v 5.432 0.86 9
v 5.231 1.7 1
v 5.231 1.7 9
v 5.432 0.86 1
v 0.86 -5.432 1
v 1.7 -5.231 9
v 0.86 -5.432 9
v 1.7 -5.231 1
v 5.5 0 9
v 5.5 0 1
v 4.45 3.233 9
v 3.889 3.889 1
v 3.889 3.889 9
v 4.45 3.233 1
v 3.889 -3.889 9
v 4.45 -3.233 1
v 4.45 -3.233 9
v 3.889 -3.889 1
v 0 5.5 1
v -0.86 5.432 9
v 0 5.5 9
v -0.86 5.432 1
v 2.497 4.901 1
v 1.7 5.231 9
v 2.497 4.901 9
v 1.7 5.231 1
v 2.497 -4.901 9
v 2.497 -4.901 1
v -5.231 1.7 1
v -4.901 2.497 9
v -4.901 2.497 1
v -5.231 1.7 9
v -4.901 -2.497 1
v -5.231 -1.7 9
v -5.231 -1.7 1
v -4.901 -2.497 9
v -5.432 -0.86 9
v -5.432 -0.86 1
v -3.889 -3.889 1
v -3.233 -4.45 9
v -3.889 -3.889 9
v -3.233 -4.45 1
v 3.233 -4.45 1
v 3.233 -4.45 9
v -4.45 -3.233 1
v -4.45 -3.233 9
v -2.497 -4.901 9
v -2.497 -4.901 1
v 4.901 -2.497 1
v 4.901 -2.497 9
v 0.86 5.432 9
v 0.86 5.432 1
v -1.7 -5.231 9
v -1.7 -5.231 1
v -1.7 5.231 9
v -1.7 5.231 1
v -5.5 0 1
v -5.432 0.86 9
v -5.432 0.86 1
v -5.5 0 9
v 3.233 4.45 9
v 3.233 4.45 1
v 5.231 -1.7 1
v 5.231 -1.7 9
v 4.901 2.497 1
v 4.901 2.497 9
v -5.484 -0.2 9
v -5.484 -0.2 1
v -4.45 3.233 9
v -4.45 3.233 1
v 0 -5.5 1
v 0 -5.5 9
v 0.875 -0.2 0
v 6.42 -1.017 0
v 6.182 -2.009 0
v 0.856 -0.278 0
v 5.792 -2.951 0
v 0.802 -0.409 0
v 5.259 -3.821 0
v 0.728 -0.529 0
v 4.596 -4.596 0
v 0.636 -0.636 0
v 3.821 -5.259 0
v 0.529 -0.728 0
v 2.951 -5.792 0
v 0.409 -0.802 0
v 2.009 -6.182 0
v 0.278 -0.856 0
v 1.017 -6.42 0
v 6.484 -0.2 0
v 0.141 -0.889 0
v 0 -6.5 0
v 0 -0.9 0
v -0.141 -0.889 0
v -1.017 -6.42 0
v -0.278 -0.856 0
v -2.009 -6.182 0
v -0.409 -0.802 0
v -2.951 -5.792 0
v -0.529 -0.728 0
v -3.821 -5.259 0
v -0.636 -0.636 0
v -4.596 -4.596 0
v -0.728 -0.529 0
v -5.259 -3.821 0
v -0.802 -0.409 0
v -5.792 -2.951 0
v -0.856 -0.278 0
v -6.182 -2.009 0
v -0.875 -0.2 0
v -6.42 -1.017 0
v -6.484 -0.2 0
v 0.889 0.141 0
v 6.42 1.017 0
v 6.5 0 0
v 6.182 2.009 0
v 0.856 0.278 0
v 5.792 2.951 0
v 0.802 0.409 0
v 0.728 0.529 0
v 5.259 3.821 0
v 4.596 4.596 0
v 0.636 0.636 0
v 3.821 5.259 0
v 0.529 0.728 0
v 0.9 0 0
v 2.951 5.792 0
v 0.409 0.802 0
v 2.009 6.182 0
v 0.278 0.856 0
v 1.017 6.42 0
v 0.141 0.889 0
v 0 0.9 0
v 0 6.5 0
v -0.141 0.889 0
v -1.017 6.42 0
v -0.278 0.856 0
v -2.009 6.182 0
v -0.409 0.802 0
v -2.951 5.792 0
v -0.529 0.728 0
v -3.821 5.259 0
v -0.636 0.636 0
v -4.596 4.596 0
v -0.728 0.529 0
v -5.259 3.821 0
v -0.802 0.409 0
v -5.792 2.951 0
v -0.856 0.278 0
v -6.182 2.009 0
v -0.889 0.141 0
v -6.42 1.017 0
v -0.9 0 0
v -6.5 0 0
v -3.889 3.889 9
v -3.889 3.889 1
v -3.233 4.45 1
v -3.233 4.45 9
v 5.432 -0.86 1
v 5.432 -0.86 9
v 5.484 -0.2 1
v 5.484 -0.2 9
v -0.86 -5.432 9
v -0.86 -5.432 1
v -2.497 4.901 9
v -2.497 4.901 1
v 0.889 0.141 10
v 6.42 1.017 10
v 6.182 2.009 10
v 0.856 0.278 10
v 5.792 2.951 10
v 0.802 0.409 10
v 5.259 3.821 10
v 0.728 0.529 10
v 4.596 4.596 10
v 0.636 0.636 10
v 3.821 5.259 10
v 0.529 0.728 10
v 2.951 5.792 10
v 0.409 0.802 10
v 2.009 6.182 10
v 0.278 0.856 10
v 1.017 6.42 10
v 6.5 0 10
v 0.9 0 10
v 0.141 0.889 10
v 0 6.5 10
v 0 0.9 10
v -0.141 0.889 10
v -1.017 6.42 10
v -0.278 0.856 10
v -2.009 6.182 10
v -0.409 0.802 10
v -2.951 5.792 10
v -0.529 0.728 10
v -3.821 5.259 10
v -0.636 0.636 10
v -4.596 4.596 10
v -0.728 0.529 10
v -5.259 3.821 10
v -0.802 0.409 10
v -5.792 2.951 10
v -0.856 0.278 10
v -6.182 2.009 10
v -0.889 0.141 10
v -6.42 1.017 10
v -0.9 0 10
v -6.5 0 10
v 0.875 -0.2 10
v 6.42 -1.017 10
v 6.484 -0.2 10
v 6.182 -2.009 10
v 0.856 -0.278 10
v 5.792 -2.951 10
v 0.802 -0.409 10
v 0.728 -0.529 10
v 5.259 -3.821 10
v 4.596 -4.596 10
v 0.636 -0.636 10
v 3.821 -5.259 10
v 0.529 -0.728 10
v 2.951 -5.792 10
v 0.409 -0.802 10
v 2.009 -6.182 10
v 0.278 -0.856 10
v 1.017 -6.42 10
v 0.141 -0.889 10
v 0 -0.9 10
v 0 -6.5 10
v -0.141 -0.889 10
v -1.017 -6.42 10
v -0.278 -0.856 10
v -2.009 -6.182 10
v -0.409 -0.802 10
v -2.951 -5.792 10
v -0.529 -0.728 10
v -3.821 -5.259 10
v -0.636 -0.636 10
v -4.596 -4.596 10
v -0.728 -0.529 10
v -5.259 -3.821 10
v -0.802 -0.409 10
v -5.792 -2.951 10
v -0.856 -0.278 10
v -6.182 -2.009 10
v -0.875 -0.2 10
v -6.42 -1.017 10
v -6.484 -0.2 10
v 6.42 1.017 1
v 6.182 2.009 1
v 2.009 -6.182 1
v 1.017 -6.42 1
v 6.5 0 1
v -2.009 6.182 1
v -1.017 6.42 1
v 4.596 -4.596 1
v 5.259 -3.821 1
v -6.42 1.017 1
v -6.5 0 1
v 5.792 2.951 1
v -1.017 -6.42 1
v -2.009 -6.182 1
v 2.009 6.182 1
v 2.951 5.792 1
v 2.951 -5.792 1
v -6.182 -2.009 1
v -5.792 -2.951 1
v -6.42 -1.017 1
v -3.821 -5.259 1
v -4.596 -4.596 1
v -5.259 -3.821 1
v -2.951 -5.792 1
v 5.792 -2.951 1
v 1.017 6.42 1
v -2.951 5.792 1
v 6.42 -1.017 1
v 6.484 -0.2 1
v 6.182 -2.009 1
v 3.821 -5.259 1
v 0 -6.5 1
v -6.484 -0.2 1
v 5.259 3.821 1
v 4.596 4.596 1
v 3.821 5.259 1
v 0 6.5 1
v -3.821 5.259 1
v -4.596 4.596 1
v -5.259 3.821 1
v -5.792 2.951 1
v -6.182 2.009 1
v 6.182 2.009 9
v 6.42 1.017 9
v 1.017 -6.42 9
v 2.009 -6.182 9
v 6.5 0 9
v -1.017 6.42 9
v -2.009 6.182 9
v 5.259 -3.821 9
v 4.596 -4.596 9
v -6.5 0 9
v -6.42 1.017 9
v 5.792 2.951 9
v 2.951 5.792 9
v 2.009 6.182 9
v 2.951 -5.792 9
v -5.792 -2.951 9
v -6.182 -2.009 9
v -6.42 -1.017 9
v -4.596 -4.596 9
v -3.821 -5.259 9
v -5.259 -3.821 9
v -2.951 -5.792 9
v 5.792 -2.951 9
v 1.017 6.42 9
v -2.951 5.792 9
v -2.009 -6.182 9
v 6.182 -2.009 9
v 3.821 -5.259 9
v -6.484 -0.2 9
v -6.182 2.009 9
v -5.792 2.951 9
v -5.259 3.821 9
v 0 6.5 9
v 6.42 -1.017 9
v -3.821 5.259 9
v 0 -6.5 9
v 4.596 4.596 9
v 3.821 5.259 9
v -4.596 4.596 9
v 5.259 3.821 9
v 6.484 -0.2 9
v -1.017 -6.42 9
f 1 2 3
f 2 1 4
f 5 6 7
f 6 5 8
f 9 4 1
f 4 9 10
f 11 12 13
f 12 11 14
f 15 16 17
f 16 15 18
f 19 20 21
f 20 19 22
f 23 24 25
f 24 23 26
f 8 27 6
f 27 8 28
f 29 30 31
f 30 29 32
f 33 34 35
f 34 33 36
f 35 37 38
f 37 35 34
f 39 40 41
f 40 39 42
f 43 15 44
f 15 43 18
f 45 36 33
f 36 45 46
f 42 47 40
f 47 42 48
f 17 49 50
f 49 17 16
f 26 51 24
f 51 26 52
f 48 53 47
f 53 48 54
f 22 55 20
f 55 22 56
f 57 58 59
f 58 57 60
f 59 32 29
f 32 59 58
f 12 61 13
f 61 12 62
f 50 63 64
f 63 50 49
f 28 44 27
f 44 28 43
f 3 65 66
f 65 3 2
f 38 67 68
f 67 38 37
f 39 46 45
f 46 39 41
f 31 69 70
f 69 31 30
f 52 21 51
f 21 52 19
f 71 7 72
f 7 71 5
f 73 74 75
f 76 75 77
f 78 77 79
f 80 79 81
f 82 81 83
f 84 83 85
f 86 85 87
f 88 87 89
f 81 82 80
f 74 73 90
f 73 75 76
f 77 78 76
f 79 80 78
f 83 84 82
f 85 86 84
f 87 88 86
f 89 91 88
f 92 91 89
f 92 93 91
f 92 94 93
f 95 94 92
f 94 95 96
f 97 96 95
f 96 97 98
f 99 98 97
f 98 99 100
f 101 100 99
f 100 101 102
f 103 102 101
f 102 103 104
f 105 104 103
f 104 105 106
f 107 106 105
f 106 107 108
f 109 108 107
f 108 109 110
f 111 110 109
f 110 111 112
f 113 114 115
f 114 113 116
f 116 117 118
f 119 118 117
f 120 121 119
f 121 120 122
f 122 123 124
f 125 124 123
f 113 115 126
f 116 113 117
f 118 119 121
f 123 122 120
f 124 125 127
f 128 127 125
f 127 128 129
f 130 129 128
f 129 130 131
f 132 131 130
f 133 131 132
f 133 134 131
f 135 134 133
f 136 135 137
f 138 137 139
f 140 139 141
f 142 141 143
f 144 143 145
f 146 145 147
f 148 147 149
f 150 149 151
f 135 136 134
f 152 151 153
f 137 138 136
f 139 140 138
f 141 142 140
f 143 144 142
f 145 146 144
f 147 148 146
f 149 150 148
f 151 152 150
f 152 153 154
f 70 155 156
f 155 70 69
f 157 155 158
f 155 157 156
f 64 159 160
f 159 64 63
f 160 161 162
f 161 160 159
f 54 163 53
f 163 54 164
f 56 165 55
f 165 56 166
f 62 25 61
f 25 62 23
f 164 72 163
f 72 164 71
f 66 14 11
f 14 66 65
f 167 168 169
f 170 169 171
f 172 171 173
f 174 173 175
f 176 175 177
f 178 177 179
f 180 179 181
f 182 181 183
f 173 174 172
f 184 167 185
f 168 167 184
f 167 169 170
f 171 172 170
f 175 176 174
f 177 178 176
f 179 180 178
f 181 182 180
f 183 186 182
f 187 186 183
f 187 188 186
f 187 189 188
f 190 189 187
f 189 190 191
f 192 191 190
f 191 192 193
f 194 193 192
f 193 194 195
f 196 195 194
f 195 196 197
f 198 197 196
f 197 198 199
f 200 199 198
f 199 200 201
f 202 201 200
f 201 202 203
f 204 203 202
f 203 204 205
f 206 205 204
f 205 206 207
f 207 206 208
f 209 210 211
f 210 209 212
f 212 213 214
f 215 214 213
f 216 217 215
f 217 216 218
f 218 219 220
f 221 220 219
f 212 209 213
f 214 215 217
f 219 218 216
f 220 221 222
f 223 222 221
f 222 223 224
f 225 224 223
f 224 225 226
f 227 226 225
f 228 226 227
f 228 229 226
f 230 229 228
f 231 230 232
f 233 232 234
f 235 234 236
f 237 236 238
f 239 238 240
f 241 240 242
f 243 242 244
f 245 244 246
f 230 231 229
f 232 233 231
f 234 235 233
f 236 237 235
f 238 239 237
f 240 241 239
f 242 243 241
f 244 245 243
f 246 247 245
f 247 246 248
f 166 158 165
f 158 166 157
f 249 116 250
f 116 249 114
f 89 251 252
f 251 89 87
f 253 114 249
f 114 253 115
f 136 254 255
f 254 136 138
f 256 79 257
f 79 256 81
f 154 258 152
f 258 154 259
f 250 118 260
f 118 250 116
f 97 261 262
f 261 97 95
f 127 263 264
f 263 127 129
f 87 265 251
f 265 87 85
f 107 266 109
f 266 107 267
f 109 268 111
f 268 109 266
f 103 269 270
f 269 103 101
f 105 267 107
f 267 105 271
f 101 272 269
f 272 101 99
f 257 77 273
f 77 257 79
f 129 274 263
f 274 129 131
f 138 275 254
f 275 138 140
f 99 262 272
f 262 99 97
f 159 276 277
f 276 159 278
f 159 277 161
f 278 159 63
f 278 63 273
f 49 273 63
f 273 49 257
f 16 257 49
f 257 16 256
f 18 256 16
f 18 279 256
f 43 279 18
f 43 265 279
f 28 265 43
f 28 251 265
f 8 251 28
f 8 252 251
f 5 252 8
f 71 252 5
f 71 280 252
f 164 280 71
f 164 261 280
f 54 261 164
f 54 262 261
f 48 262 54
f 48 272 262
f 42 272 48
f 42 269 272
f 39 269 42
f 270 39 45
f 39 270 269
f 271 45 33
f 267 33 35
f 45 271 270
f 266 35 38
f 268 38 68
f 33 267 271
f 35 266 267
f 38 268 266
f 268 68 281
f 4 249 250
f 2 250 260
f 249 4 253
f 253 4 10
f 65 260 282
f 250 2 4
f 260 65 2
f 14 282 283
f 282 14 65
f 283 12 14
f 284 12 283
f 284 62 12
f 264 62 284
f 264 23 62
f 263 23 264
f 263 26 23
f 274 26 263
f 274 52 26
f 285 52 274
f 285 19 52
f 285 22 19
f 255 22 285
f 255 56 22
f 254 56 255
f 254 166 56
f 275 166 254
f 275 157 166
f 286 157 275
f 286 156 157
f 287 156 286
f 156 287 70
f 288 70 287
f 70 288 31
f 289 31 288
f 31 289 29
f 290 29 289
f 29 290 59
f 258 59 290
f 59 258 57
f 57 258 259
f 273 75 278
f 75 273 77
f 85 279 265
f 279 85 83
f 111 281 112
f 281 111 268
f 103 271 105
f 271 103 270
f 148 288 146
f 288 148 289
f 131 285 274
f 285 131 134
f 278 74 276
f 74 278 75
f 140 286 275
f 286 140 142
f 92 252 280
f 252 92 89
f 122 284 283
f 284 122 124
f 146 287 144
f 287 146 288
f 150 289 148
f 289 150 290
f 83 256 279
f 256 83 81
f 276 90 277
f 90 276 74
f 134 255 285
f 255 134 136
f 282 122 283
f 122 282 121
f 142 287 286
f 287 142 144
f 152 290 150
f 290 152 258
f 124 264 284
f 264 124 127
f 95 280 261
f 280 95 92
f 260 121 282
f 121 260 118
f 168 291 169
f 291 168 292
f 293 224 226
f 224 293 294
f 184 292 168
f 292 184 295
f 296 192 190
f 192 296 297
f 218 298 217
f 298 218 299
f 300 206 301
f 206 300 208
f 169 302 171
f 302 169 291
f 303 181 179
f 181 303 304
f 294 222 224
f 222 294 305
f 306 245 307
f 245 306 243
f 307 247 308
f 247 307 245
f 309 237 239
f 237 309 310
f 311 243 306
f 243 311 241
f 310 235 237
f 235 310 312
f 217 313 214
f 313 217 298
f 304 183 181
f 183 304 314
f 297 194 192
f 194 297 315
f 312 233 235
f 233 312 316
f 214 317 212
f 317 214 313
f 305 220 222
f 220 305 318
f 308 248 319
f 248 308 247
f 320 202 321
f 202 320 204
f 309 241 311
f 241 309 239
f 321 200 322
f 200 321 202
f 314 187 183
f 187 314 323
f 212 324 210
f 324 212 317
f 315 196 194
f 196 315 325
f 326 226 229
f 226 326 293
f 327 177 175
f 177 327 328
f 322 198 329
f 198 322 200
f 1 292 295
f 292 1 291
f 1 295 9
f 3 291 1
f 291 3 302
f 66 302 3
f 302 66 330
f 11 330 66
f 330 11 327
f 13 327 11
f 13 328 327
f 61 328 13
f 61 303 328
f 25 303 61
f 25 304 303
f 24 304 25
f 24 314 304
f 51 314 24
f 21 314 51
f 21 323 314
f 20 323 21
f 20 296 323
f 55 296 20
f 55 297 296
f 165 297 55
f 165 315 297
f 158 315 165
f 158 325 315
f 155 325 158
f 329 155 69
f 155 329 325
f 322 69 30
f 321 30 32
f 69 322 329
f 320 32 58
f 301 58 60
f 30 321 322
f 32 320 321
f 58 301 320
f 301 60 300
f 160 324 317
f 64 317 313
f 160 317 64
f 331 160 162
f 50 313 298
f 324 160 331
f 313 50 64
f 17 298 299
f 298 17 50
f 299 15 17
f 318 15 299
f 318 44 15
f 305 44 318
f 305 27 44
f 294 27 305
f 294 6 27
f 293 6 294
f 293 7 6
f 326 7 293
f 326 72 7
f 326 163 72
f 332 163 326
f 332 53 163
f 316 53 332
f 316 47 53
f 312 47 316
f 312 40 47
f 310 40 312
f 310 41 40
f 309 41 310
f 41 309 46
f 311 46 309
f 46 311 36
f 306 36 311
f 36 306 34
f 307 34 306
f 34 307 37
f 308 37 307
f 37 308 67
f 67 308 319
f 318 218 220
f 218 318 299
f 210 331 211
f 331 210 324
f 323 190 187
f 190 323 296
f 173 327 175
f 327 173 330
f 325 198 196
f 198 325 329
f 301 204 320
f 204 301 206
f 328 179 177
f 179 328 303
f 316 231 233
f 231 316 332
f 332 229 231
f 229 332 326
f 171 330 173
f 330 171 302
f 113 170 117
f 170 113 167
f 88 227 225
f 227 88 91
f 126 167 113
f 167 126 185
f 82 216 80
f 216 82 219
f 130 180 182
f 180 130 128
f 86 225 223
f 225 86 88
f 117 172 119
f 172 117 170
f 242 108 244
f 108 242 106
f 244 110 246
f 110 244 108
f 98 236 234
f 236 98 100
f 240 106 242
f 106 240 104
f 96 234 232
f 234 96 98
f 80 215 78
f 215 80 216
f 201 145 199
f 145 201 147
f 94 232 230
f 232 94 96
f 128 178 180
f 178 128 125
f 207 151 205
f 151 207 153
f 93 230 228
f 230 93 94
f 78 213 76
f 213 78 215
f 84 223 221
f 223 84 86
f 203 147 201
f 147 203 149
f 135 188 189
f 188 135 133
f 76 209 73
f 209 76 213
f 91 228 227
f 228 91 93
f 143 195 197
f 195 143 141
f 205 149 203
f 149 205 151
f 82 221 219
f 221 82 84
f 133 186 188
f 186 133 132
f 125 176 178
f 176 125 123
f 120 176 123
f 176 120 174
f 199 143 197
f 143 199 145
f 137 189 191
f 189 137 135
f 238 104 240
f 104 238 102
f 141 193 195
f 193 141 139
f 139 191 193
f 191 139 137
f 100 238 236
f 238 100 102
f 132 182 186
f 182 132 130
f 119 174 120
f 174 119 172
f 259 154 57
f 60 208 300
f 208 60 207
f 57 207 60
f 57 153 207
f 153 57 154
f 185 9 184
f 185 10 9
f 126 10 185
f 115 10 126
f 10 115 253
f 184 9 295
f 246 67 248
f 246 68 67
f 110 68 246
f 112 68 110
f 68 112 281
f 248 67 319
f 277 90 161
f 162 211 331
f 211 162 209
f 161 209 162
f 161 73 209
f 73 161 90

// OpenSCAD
$fn=40;

cap();

module cap() {
    difference() {
        union() {
            linear_extrude(10) circle(5.5);
            linear_extrude(1) circle(6.5);
            translate([0,0,9]) linear_extrude(1) circle(6.5);
        }
        linear_extrude(10) circle(0.9);
        translate([-25,0,0]) rotate([90,0,0]) linear_extrude(0.2) square(50,50);
    }
}
